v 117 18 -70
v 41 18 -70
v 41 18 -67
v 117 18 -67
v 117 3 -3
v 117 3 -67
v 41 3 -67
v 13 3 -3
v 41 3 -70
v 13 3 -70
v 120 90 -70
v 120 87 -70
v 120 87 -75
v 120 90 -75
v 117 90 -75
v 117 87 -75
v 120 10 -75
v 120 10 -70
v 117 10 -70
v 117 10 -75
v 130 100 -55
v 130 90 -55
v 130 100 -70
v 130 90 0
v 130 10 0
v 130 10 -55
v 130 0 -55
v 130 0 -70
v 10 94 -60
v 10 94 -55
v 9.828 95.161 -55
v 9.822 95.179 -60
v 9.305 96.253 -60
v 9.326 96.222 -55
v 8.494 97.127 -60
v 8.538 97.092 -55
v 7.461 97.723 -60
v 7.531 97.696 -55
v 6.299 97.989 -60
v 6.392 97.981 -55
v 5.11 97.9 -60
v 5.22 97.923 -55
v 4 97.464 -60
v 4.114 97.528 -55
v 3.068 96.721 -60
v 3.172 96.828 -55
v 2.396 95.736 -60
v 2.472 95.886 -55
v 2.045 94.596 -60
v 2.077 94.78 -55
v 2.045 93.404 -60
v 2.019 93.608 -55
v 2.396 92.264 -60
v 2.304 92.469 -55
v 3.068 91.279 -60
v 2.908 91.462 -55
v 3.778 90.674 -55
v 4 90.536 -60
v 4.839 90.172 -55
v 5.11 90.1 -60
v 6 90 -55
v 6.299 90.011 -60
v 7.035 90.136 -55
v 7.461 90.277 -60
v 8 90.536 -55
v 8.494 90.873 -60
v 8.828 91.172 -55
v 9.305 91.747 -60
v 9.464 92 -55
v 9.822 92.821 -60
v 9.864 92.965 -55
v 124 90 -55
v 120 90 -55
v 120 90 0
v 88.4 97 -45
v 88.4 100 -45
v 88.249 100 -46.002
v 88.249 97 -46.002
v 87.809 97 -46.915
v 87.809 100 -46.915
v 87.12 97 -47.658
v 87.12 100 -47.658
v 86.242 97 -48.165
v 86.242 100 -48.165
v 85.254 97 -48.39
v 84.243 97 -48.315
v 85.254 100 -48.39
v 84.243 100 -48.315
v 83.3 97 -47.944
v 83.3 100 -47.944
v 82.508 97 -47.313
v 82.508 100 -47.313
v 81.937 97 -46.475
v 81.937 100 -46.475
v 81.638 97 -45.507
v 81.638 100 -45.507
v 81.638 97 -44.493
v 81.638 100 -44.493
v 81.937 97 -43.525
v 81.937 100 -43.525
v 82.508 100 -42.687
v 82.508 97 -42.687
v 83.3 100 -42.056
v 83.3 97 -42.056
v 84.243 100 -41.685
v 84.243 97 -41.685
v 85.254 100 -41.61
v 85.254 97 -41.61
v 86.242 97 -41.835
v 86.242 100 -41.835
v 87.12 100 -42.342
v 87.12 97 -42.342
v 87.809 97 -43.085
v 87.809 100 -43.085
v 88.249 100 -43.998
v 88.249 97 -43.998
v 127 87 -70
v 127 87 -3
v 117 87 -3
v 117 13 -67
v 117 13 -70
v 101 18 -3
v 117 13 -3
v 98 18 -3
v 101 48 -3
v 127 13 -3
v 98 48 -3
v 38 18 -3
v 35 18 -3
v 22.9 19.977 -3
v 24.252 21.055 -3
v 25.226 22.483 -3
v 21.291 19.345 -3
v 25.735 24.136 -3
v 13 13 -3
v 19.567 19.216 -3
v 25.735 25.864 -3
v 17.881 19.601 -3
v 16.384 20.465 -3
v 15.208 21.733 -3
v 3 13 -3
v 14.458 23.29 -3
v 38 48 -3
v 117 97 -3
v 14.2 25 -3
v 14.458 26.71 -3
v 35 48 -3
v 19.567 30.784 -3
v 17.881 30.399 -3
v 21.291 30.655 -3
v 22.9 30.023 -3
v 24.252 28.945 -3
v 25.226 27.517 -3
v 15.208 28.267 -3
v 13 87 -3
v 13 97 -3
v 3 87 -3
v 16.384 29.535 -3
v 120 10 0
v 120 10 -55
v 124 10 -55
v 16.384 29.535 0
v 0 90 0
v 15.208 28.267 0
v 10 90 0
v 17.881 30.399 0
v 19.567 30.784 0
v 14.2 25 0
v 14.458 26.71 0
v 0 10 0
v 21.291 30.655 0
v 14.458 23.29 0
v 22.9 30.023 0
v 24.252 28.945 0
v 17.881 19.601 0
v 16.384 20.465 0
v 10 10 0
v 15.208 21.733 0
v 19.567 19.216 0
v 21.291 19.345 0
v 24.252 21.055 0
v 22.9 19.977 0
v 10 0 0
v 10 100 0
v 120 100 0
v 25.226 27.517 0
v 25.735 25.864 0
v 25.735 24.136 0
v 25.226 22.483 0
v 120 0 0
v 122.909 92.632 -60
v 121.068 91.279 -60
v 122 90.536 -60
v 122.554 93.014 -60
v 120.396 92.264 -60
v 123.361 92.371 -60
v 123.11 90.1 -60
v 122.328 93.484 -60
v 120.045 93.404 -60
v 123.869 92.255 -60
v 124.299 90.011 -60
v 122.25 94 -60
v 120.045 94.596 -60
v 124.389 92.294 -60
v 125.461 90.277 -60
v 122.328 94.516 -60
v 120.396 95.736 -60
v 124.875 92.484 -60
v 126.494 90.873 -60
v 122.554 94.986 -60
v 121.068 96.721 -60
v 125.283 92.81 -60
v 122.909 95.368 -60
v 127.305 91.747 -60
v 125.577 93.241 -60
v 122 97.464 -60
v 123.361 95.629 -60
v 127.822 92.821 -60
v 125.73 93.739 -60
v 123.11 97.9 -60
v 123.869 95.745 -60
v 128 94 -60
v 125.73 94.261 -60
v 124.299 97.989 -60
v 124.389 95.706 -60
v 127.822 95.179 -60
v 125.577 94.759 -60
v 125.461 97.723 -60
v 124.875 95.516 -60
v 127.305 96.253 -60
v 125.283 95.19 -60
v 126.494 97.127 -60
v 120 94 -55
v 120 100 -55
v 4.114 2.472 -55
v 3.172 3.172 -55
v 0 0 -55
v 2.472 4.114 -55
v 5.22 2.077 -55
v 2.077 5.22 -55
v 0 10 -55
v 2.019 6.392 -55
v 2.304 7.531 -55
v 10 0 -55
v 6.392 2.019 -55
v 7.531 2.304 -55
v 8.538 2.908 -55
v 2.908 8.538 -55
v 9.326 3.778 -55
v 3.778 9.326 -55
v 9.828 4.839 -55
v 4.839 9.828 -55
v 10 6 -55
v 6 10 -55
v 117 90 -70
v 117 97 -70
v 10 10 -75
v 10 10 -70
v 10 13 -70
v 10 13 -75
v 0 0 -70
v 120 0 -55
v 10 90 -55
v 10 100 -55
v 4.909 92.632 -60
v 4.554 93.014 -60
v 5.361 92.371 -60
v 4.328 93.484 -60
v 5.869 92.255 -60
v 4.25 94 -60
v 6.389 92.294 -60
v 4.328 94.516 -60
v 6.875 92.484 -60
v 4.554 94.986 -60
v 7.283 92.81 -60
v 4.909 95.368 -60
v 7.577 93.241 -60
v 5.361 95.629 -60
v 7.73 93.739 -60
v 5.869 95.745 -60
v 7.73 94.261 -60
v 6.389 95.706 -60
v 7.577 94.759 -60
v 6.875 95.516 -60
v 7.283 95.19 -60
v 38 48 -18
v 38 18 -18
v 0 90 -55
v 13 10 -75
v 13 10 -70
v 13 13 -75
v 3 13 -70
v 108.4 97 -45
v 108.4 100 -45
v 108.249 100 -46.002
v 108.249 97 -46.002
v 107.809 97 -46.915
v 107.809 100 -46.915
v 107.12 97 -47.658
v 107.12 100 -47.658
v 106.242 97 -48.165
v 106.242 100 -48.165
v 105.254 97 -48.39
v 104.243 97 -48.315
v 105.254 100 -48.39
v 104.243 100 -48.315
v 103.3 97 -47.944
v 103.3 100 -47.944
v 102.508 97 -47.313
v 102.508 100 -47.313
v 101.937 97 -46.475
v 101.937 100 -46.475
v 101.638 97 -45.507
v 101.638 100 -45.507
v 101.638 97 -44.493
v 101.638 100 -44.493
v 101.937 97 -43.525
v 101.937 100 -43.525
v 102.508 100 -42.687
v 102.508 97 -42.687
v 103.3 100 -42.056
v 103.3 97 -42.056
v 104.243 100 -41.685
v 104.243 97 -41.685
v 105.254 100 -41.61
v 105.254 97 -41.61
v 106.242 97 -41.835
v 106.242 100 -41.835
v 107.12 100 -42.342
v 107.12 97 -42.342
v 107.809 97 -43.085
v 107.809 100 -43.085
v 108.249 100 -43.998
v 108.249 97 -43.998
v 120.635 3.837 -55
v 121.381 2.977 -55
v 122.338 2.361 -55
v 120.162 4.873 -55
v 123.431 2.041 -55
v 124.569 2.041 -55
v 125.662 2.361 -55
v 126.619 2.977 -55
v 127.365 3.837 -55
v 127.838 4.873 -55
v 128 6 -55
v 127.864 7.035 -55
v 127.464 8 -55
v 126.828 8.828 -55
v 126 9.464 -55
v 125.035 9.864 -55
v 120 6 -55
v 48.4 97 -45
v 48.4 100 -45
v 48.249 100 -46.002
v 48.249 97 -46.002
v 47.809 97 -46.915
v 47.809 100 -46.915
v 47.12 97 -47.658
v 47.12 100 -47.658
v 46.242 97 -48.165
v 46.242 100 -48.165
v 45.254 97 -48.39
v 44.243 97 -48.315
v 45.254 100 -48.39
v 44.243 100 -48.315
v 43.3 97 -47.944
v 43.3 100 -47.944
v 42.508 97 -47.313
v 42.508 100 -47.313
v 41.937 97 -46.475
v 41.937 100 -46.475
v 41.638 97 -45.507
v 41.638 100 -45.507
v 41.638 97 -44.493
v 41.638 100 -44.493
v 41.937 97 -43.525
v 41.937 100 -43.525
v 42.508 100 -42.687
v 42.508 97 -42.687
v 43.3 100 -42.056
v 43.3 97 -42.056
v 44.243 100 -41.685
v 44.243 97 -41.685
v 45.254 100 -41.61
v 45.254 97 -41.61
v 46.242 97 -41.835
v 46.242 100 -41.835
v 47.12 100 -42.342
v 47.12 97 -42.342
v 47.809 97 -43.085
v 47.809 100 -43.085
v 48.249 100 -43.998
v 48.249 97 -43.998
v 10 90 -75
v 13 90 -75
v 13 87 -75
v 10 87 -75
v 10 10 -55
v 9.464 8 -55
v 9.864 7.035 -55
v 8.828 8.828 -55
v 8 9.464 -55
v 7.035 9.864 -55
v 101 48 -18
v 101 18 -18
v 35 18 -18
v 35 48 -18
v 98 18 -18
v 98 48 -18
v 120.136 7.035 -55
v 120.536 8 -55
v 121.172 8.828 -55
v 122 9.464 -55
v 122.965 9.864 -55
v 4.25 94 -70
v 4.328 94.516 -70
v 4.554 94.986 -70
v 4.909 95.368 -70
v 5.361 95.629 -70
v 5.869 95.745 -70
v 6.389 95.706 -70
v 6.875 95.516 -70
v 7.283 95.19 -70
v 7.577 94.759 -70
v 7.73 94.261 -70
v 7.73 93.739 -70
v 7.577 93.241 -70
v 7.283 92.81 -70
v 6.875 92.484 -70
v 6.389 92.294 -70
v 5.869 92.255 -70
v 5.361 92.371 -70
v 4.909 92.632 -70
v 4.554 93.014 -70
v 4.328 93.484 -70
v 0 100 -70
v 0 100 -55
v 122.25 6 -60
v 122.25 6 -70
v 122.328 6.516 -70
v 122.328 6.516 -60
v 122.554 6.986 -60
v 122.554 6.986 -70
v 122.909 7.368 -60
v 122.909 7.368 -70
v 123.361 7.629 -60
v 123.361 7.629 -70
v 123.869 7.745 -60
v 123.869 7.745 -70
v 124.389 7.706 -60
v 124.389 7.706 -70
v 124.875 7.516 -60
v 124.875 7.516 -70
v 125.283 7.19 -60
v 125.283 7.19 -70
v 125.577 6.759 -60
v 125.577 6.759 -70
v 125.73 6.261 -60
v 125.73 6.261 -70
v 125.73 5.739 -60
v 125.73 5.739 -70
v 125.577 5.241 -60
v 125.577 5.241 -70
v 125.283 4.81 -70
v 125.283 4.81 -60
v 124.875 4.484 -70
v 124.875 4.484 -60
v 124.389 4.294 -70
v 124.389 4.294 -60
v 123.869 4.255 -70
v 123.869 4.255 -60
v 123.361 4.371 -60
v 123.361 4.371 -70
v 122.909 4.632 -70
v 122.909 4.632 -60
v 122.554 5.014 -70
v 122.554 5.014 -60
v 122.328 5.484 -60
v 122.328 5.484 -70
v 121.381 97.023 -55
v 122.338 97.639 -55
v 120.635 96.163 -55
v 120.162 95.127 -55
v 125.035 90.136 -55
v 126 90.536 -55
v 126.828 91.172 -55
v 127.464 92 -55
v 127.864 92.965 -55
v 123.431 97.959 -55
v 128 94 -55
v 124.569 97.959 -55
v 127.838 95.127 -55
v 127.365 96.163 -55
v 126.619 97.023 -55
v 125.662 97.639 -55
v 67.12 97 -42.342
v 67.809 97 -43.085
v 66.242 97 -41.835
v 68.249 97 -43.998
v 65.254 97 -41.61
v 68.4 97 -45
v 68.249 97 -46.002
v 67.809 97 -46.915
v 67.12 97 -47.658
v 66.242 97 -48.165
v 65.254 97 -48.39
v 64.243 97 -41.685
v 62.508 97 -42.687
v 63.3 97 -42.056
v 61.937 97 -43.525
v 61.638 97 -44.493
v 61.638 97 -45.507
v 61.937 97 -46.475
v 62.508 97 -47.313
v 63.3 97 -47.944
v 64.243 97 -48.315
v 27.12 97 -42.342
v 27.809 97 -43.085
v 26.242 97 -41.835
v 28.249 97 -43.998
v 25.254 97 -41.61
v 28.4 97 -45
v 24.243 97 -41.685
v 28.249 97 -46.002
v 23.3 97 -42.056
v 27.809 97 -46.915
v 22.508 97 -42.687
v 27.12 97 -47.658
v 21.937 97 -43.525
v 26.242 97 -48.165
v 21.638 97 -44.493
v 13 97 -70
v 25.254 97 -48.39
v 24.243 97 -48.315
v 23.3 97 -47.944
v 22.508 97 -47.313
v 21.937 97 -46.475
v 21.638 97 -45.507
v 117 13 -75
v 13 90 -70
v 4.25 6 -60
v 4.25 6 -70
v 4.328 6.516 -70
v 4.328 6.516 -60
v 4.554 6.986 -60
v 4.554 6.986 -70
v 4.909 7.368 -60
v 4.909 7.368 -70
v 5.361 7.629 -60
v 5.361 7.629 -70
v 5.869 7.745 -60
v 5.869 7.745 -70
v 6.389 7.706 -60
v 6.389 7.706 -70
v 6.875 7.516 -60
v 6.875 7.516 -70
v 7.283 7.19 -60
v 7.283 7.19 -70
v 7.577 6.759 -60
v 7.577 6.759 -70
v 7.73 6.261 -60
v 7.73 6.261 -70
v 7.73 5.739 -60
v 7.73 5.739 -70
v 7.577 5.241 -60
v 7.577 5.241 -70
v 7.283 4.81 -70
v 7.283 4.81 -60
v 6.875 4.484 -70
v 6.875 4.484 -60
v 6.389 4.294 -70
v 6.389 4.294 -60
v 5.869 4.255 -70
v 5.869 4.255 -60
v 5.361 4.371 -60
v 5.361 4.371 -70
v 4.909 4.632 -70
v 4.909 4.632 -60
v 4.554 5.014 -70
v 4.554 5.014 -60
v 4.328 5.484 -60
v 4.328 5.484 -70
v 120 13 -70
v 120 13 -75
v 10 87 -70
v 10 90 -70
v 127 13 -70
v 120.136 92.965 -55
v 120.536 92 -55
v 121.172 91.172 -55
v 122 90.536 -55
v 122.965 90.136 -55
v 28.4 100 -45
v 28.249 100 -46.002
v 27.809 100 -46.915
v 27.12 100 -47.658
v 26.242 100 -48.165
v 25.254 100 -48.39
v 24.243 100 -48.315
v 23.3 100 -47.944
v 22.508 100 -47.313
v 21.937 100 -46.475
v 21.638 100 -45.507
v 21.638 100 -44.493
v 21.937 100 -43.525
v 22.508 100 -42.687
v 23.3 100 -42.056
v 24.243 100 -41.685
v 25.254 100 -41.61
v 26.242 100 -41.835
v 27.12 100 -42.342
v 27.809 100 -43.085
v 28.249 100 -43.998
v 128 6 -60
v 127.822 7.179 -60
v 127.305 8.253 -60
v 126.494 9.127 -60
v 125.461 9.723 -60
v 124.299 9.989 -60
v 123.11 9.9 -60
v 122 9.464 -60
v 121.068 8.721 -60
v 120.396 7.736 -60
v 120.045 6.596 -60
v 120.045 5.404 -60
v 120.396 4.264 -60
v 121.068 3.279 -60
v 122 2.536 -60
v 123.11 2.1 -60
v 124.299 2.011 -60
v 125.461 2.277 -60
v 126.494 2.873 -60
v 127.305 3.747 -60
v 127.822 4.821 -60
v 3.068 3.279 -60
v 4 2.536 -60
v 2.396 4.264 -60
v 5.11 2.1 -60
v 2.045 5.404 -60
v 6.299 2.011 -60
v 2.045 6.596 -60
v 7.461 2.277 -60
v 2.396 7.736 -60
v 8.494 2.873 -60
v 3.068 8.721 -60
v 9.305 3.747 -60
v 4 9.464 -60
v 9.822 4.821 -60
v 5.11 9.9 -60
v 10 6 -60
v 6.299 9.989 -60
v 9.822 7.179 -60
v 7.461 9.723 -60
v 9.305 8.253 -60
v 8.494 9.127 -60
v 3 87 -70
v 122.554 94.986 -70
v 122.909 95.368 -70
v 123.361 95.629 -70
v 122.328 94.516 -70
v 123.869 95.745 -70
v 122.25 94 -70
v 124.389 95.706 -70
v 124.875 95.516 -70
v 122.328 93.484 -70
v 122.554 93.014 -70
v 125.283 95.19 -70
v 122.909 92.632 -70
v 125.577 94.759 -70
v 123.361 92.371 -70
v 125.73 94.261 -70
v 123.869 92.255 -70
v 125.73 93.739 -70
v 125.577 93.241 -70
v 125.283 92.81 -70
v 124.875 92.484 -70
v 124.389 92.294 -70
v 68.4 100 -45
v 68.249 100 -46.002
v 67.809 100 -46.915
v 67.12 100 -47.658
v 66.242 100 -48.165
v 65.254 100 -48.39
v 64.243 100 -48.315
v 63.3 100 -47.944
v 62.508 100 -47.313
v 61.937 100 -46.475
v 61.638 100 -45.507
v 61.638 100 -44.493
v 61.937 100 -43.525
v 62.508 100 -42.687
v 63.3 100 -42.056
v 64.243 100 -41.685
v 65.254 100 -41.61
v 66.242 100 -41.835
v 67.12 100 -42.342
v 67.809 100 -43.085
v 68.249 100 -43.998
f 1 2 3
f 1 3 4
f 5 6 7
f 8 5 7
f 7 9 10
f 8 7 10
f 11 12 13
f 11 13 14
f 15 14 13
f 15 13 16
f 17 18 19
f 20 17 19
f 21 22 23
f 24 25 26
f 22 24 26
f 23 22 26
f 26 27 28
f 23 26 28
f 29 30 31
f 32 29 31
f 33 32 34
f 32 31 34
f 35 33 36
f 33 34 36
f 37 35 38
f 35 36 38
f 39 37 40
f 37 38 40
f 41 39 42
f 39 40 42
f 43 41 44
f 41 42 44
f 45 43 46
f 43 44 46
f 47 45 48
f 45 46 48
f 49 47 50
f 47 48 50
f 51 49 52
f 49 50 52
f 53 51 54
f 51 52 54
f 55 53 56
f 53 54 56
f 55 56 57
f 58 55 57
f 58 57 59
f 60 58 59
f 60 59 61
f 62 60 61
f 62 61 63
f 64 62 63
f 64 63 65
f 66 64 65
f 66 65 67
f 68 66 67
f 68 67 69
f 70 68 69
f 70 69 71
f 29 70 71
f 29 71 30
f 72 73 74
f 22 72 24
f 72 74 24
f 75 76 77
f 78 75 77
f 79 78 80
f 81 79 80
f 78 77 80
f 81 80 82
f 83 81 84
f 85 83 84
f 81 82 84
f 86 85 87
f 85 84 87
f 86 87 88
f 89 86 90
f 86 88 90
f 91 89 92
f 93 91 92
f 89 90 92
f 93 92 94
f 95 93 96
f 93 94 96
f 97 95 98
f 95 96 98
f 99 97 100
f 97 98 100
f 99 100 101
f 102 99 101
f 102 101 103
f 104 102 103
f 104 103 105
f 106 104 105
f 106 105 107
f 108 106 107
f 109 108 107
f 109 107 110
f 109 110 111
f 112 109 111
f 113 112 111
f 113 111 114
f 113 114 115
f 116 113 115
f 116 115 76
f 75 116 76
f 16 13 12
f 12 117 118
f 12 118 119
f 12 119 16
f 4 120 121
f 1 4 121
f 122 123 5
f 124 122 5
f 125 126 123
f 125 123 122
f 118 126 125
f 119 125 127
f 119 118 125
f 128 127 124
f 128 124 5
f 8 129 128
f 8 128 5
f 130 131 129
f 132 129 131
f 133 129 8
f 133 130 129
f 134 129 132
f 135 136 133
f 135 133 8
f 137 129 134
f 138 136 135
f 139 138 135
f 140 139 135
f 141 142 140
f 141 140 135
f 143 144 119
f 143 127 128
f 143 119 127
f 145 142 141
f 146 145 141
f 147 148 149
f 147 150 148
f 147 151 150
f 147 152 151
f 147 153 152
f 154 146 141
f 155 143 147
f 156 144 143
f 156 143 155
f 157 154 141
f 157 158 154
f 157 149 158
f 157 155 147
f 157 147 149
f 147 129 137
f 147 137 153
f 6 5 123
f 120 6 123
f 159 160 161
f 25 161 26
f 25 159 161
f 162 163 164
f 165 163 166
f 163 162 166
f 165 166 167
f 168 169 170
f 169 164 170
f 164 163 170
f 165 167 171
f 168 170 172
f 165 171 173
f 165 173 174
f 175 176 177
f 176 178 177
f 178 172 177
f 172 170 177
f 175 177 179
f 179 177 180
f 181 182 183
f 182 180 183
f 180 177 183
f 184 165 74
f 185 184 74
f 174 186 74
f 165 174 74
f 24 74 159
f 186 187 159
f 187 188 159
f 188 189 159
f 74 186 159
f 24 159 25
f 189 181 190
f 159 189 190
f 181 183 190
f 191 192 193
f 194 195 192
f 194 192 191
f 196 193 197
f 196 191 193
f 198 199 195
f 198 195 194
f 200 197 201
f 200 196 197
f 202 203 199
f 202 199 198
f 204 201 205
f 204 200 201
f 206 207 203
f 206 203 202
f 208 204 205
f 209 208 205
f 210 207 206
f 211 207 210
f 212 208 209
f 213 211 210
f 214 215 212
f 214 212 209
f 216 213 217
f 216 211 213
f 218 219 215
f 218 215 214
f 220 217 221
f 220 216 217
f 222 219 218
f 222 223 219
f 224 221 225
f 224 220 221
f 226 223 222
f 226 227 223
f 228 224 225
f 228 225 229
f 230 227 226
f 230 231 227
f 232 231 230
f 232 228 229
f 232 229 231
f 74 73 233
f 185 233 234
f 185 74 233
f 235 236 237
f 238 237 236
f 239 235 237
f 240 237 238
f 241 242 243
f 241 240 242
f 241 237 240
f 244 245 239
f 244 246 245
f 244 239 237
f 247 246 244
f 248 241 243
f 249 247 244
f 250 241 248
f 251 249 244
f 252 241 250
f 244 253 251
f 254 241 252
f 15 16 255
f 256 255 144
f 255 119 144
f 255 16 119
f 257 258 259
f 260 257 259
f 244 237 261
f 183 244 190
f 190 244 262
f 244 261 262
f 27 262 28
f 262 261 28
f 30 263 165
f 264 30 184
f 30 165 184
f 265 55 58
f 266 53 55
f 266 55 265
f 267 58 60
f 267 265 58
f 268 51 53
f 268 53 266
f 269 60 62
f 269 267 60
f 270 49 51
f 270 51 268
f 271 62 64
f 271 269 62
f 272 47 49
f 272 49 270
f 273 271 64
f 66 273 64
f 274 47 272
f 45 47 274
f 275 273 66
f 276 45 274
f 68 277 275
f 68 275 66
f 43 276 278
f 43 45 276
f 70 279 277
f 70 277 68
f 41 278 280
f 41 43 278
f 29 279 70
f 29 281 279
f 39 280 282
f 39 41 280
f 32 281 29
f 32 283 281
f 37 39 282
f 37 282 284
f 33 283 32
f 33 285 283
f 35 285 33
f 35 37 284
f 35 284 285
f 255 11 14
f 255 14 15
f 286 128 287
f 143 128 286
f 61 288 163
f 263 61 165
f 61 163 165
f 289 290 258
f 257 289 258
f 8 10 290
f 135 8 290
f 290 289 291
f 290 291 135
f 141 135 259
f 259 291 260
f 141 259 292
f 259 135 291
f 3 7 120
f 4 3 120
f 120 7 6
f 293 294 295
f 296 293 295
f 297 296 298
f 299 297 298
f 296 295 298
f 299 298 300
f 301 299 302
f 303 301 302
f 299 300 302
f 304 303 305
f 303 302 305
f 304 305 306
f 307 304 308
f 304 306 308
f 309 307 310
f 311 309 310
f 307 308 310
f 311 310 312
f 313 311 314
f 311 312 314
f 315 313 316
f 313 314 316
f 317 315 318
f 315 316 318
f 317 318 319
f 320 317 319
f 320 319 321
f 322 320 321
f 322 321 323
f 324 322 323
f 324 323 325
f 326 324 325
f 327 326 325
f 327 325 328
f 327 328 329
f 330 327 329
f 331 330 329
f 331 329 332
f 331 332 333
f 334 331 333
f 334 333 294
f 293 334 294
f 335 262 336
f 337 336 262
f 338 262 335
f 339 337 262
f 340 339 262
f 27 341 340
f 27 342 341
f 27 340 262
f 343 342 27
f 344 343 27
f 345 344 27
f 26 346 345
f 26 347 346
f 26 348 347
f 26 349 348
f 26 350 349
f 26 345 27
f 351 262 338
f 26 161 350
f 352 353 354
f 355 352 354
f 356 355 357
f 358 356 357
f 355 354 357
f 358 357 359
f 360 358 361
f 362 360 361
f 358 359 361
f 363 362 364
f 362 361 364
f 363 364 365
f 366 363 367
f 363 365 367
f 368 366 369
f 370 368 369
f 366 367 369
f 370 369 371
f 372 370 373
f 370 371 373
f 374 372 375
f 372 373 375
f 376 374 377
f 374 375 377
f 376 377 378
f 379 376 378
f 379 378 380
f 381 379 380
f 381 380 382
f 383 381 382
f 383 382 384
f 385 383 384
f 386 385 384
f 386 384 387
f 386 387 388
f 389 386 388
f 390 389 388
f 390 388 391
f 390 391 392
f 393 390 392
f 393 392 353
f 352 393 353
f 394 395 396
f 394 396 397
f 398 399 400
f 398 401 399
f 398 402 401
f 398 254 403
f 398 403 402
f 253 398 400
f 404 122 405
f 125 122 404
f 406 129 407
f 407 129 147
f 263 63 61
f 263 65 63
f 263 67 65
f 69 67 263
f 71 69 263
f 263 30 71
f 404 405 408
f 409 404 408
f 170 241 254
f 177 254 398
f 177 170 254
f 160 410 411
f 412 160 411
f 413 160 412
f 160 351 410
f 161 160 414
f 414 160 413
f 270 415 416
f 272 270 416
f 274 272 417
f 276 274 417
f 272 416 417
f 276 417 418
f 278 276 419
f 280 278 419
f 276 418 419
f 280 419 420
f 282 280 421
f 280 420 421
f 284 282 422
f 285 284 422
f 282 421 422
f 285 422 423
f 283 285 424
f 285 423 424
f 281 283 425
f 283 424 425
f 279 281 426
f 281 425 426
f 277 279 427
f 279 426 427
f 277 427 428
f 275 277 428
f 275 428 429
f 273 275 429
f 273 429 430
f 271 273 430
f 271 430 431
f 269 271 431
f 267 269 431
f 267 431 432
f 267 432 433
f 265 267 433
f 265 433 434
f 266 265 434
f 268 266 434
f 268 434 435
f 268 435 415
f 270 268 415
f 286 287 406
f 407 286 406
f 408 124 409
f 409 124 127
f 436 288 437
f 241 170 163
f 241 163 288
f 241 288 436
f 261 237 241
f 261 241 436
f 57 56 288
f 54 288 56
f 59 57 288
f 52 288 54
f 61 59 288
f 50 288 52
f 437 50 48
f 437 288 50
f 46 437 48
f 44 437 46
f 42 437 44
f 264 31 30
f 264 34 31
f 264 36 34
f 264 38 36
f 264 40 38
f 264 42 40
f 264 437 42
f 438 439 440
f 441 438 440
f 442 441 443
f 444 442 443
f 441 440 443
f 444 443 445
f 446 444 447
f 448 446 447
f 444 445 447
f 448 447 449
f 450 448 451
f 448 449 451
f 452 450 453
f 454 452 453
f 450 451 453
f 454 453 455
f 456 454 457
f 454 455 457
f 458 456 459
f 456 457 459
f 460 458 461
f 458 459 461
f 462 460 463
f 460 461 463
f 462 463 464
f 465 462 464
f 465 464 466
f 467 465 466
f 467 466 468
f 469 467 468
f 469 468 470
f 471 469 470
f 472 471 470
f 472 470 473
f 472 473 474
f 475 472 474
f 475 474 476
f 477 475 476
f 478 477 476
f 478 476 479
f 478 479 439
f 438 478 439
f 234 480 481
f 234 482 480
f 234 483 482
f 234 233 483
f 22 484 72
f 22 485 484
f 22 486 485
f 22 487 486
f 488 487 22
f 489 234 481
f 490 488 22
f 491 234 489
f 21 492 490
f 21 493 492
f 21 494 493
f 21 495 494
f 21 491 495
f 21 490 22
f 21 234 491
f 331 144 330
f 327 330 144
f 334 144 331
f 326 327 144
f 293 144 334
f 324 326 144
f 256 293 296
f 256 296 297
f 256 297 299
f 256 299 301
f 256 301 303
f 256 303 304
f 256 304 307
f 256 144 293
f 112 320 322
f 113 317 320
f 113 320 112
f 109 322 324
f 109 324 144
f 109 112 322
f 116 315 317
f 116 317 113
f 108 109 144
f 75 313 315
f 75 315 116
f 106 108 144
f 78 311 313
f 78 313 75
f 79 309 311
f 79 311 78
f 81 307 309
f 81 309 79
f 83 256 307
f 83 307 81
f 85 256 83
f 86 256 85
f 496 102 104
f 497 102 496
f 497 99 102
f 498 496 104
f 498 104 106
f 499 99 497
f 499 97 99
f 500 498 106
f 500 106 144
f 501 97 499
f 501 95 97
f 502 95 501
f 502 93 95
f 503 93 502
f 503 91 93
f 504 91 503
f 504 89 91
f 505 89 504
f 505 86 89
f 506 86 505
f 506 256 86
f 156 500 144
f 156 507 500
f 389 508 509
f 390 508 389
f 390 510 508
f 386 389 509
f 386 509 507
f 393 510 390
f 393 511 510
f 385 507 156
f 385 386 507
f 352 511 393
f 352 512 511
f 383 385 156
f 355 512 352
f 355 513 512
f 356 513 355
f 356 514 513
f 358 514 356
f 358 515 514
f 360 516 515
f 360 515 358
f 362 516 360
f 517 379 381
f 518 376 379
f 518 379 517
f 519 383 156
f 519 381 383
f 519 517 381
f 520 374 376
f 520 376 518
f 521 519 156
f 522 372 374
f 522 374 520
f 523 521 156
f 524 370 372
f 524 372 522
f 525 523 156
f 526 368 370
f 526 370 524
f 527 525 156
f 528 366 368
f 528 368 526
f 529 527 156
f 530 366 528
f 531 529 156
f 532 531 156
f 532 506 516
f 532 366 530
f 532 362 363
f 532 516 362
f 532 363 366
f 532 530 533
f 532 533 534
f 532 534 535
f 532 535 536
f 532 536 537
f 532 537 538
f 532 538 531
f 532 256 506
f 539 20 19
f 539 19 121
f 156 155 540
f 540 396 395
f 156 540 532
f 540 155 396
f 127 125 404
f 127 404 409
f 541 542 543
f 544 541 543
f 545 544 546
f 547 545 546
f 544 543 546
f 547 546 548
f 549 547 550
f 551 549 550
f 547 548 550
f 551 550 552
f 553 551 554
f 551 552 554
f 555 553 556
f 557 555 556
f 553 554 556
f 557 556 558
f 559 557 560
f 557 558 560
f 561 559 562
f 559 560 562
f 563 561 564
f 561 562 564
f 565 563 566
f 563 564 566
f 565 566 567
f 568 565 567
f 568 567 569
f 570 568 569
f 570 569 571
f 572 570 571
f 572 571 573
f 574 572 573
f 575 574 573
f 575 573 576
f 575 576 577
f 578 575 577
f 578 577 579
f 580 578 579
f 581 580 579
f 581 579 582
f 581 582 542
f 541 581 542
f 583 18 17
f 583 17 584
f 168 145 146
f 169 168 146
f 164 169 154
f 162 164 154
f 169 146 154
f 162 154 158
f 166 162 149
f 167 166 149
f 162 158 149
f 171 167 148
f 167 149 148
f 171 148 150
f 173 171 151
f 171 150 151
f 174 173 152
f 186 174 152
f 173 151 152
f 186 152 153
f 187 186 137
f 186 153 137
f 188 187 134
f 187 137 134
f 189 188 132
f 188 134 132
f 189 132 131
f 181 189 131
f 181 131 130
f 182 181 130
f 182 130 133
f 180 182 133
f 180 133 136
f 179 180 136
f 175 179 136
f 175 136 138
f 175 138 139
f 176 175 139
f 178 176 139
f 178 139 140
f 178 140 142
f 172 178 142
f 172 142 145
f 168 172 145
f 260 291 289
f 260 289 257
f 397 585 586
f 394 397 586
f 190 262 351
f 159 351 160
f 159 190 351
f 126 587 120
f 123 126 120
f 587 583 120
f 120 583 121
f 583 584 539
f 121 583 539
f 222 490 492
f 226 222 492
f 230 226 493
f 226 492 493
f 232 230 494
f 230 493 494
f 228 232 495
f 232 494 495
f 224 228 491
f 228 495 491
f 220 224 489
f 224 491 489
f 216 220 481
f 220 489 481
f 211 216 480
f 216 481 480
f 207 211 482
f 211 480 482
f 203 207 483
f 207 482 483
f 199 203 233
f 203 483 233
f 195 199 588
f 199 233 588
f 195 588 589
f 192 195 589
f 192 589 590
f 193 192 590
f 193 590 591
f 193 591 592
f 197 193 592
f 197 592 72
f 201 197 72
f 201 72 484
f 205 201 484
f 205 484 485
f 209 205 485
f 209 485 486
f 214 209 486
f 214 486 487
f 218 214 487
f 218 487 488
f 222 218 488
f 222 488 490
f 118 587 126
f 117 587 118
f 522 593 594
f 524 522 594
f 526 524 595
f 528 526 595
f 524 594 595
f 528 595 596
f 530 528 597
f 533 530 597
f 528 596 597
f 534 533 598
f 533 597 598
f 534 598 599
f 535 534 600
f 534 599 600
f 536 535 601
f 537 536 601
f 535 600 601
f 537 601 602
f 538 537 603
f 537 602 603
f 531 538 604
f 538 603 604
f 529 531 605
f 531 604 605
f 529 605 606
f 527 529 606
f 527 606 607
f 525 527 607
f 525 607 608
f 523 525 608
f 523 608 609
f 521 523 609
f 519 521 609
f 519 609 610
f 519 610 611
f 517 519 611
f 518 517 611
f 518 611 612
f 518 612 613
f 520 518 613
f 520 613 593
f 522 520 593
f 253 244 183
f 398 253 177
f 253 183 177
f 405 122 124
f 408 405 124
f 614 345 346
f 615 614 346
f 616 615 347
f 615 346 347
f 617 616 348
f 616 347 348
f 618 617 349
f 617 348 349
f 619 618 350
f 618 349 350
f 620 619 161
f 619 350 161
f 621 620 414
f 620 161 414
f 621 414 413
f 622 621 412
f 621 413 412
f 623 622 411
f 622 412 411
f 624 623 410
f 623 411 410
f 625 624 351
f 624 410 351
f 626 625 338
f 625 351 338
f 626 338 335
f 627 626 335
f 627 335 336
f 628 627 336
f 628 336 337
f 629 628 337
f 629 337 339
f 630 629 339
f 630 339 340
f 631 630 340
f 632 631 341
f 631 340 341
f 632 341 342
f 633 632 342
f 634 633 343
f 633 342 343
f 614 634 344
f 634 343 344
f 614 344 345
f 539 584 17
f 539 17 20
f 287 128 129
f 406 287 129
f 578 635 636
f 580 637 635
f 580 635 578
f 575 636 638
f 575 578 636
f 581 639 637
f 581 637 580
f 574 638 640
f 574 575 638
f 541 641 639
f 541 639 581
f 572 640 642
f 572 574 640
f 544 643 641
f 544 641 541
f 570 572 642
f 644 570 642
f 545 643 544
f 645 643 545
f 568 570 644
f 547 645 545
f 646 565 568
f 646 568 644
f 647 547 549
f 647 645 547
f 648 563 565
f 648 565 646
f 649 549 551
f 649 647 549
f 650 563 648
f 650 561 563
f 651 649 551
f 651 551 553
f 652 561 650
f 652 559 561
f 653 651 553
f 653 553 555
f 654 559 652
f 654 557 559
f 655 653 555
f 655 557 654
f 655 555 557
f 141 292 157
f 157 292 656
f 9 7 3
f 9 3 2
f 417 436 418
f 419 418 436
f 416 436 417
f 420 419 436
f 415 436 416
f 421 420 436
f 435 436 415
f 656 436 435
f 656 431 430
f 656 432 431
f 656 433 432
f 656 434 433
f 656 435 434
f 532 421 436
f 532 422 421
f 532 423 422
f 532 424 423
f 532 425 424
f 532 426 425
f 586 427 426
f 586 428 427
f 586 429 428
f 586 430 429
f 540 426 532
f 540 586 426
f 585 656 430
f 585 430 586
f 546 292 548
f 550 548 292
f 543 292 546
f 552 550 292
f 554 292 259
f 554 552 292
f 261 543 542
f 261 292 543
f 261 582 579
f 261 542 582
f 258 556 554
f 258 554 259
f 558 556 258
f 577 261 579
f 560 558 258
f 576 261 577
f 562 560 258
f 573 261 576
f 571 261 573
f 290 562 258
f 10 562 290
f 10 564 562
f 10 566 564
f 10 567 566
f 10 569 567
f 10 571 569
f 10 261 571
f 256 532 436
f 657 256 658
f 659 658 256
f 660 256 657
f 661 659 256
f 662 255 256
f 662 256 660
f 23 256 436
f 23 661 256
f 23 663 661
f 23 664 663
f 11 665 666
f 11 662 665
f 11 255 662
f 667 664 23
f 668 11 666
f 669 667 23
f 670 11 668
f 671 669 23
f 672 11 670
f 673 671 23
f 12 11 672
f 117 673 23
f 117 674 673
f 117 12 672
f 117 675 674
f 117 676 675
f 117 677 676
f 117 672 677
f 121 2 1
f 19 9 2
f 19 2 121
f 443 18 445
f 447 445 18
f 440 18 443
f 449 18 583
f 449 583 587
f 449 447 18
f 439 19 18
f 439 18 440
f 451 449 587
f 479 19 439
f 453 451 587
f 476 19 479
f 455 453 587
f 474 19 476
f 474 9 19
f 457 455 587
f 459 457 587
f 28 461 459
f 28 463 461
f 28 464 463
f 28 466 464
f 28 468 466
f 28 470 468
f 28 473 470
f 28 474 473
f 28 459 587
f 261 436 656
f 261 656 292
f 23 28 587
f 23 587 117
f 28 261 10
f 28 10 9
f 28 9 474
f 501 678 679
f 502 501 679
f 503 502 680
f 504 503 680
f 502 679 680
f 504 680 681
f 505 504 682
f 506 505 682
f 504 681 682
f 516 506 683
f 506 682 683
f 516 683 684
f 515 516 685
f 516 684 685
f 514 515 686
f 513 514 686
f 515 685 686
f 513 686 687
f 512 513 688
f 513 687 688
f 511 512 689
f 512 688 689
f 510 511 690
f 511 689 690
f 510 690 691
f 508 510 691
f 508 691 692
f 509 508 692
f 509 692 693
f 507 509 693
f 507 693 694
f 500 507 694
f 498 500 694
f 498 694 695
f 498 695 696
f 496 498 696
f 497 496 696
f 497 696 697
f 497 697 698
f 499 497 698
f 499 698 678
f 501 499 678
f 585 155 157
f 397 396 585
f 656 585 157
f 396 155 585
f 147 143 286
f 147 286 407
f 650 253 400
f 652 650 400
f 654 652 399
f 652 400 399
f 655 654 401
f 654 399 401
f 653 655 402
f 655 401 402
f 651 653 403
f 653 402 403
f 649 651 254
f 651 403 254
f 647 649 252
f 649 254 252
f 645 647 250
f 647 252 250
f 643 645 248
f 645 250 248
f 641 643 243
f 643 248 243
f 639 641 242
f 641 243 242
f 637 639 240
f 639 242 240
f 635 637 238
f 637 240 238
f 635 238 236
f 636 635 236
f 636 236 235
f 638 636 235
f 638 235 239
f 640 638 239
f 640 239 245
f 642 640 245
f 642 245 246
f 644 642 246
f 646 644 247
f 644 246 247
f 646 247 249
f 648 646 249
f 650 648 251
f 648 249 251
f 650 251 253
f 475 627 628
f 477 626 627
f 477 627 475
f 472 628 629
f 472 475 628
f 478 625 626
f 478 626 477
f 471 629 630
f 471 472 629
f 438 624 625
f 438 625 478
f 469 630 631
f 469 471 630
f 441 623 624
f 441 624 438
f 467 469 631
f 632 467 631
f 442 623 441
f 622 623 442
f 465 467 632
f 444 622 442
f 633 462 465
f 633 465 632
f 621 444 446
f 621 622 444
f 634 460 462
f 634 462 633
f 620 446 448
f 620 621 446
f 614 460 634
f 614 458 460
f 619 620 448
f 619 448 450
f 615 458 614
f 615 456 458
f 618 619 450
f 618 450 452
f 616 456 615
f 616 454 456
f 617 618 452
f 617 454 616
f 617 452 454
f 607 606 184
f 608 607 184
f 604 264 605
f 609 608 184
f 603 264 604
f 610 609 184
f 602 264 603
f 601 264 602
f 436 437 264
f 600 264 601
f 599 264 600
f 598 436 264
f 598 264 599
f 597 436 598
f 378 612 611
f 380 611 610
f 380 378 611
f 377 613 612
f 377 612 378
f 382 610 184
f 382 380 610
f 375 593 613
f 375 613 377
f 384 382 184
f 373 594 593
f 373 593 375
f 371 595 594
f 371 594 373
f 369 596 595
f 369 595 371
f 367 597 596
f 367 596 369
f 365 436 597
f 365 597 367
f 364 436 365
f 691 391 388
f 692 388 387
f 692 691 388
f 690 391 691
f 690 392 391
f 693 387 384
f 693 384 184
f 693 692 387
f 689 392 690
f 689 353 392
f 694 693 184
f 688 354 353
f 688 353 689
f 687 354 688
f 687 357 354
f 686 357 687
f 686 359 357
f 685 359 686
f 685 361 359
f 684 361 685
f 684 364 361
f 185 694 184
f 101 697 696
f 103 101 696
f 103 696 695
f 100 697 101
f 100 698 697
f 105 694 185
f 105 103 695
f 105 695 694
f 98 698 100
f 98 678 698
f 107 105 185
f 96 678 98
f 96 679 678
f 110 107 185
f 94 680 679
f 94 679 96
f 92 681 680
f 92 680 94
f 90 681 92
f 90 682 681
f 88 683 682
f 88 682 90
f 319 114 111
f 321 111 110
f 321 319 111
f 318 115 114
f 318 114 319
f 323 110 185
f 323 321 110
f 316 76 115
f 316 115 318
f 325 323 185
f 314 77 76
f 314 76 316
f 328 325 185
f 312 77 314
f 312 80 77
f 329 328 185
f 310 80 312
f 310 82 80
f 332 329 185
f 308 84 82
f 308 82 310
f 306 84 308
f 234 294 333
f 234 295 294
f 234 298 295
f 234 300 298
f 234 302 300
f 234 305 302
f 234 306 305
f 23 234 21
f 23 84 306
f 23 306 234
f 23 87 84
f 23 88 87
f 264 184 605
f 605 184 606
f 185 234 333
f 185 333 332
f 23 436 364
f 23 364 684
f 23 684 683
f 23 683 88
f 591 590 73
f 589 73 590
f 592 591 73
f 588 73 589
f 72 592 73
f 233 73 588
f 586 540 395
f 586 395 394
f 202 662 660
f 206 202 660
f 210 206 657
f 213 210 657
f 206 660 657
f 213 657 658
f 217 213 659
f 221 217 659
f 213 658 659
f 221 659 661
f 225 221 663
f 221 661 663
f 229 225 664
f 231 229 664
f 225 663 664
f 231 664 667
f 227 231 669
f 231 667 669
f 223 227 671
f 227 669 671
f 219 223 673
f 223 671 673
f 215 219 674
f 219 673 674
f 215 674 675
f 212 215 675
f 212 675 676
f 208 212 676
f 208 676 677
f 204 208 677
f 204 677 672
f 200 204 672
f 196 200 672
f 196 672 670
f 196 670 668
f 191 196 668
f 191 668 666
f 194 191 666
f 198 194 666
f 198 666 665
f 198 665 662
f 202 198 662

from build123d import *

# Parameters (mm, degrees)
SKETCH2_W           = 130
SKETCH2_H           = 70
BOSS_EXTRUDE1_DEPTH = 100
SKETCH3_W           = 104
SKETCH3_H           = 74
CUT_EXTRUDE1_DEPTH  = 67
SKETCH4_W           = 10
SKETCH4_H           = 10
CUT_EXTRUDE2_DEPTH  = 55
SKETCH5_W           = 104
SKETCH5_H           = 10
CUT_EXTRUDE3_DEPTH  = 67
SKETCH6_W           = 10
SKETCH6_H           = 74
CUT_EXTRUDE4_DEPTH  = 67
SKETCH9_R           = 1.75
CUT_EXTRUDE5_DEPTH  = 67
SKETCH10_R          = 4
CUT_EXTRUDE6_DEPTH  = 5
SKETCH12_R          = 4
CUT_EXTRUDE7_DEPTH  = 5
SKETCH13_R          = 4
CUT_EXTRUDE8_DEPTH  = 5
SKETCH14_R          = 4
CUT_EXTRUDE9_DEPTH  = 5
SKETCH15_W          = 3
SKETCH15_H          = 3
BOSS_EXTRUDE2_DEPTH = 5
SKETCH16_W          = 76
SKETCH16_H          = 3
BOSS_EXTRUDE3_DEPTH = 15
SKETCH17_W          = 3
SKETCH17_H          = 30
BOSS_EXTRUDE4_DEPTH = 15
SKETCH18_R          = 5.8
CUT_EXTRUDE10_DEPTH = 15
SKETCH19_R          = 3.4
CUT_EXTRUDE11_DEPTH = 15


with BuildPart() as part:
    # Sketch2 → Boss-Extrude1 (new body)
    with BuildSketch(Plane(origin=(0, 0, 0), x_dir=(1, 0, 0), z_dir=(0, 1, 0))):
        with Locations((65, 35)):
            Rectangle(SKETCH2_W, SKETCH2_H)
    extrude(amount=BOSS_EXTRUDE1_DEPTH)

    # Sketch3 → Cut-Extrude1 (cut)
    with BuildSketch(Plane(origin=(0, 0, -70), x_dir=(-1, 0, 0), z_dir=(0, 0, -1))):
        with Locations((-65, 50)):
            Rectangle(SKETCH3_W, SKETCH3_H)
    extrude(amount=-CUT_EXTRUDE1_DEPTH, mode=Mode.SUBTRACT)

    # Sketch4 → Cut-Extrude2 (cut)
    with BuildSketch(Plane.XY):
        with Locations((5, 95)):
            Rectangle(SKETCH4_W, SKETCH4_H)
        with Locations((125, 95)):
            Rectangle(SKETCH4_W, SKETCH4_H)
        with Locations((5, 5)):
            Rectangle(SKETCH4_W, SKETCH4_H)
        with Locations((125, 5)):
            Rectangle(SKETCH4_W, SKETCH4_H)
    extrude(amount=-CUT_EXTRUDE2_DEPTH, mode=Mode.SUBTRACT)

    # Sketch5 → Cut-Extrude3 (cut)
    with BuildSketch(Plane(origin=(0, 0, -70), x_dir=(-1, 0, 0), z_dir=(0, 0, -1))):
        with Locations((-65, 92)):
            Rectangle(SKETCH5_W, SKETCH5_H)
        with Locations((-65, 8)):
            Rectangle(SKETCH5_W, SKETCH5_H)
    extrude(amount=-CUT_EXTRUDE3_DEPTH, mode=Mode.SUBTRACT)

    # Sketch6 → Cut-Extrude4 (cut)
    with BuildSketch(Plane(origin=(0, 0, -70), x_dir=(-1, 0, 0), z_dir=(0, 0, -1))):
        with Locations((-122, 50)):
            Rectangle(SKETCH6_W, SKETCH6_H)
        with Locations((-8, 50)):
            Rectangle(SKETCH6_W, SKETCH6_H)
    extrude(amount=-CUT_EXTRUDE4_DEPTH, mode=Mode.SUBTRACT)

    # Sketch9 → Cut-Extrude5 (cut)
    with BuildSketch(Plane(origin=(0, 0, -70), x_dir=(-1, 0, 0), z_dir=(0, 0, -1))):
        with Locations((-124, 94)):
            Circle(SKETCH9_R)
        with Locations((-124, 6)):
            Circle(SKETCH9_R)
        with Locations((-6, 94)):
            Circle(SKETCH9_R)
        with Locations((-6, 6)):
            Circle(SKETCH9_R)
    extrude(amount=-CUT_EXTRUDE5_DEPTH, mode=Mode.SUBTRACT)

    # Sketch10 → Cut-Extrude6 (cut)
    with BuildSketch(Plane.XY.offset(-55)):
        with Locations((124, 94)):
            Circle(SKETCH10_R)
    extrude(amount=-CUT_EXTRUDE6_DEPTH, mode=Mode.SUBTRACT)

    # Sketch12 → Cut-Extrude7 (cut)
    with BuildSketch(Plane.XY.offset(-55)):
        with Locations((124, 6)):
            Circle(SKETCH12_R)
    extrude(amount=-CUT_EXTRUDE7_DEPTH, mode=Mode.SUBTRACT)

    # Sketch13 → Cut-Extrude8 (cut)
    with BuildSketch(Plane.XY.offset(-55)):
        with Locations((6, 6)):
            Circle(SKETCH13_R)
    extrude(amount=-CUT_EXTRUDE8_DEPTH, mode=Mode.SUBTRACT)

    # Sketch14 → Cut-Extrude9 (cut)
    with BuildSketch(Plane.XY.offset(-55)):
        with Locations((6, 94)):
            Circle(SKETCH14_R)
    extrude(amount=-CUT_EXTRUDE9_DEPTH, mode=Mode.SUBTRACT)

    # Sketch15 → Boss-Extrude2 (add)
    with BuildSketch(Plane(origin=(0, 0, -70), x_dir=(-1, 0, 0), z_dir=(0, 0, -1))):
        with Locations((-118.5, 88.5)):
            Rectangle(SKETCH15_W, SKETCH15_H)
        with Locations((-118.5, 11.5)):
            Rectangle(SKETCH15_W, SKETCH15_H)
        with Locations((-11.5, 11.5)):
            Rectangle(SKETCH15_W, SKETCH15_H)
        with Locations((-11.5, 88.5)):
            Rectangle(SKETCH15_W, SKETCH15_H)
    extrude(amount=BOSS_EXTRUDE2_DEPTH)

    # Sketch16 → Boss-Extrude3 (add)
    with BuildSketch(Plane(origin=(0, 3, 0), x_dir=(1, 0, 0), z_dir=(0, 1, 0))):
        with Locations((79, 68.5)):
            Rectangle(SKETCH16_W, SKETCH16_H)
    extrude(amount=BOSS_EXTRUDE3_DEPTH)

    # Sketch17 → Boss-Extrude4 (add)
    with BuildSketch(Plane(origin=(0, 0, -3), x_dir=(-1, 0, 0), z_dir=(0, 0, -1))):
        with Locations((-99.5, 33)):
            Rectangle(SKETCH17_W, SKETCH17_H)
        with Locations((-36.5, 33)):
            Rectangle(SKETCH17_W, SKETCH17_H)
    extrude(amount=BOSS_EXTRUDE4_DEPTH)

    # Sketch18 → Cut-Extrude10 (cut)
    with BuildSketch(Plane(origin=(0, 0, -3), x_dir=(-1, 0, 0), z_dir=(0, 0, -1))):
        with Locations((-20, 25)):
            Circle(SKETCH18_R)
    extrude(amount=-CUT_EXTRUDE10_DEPTH, mode=Mode.SUBTRACT)

    # Sketch19 → Cut-Extrude11 (cut)
    with BuildSketch(Plane(origin=(0, 100, 0), x_dir=(1, 0, 0), z_dir=(0, 1, 0))):
        with Locations((25, 45)):
            Circle(SKETCH19_R)
        with Locations((45, 45)):
            Circle(SKETCH19_R)
        with Locations((65, 45)):
            Circle(SKETCH19_R)
        with Locations((85, 45)):
            Circle(SKETCH19_R)
        with Locations((105, 45)):
            Circle(SKETCH19_R)
    extrude(amount=-CUT_EXTRUDE11_DEPTH, mode=Mode.SUBTRACT)


solid = part.part
